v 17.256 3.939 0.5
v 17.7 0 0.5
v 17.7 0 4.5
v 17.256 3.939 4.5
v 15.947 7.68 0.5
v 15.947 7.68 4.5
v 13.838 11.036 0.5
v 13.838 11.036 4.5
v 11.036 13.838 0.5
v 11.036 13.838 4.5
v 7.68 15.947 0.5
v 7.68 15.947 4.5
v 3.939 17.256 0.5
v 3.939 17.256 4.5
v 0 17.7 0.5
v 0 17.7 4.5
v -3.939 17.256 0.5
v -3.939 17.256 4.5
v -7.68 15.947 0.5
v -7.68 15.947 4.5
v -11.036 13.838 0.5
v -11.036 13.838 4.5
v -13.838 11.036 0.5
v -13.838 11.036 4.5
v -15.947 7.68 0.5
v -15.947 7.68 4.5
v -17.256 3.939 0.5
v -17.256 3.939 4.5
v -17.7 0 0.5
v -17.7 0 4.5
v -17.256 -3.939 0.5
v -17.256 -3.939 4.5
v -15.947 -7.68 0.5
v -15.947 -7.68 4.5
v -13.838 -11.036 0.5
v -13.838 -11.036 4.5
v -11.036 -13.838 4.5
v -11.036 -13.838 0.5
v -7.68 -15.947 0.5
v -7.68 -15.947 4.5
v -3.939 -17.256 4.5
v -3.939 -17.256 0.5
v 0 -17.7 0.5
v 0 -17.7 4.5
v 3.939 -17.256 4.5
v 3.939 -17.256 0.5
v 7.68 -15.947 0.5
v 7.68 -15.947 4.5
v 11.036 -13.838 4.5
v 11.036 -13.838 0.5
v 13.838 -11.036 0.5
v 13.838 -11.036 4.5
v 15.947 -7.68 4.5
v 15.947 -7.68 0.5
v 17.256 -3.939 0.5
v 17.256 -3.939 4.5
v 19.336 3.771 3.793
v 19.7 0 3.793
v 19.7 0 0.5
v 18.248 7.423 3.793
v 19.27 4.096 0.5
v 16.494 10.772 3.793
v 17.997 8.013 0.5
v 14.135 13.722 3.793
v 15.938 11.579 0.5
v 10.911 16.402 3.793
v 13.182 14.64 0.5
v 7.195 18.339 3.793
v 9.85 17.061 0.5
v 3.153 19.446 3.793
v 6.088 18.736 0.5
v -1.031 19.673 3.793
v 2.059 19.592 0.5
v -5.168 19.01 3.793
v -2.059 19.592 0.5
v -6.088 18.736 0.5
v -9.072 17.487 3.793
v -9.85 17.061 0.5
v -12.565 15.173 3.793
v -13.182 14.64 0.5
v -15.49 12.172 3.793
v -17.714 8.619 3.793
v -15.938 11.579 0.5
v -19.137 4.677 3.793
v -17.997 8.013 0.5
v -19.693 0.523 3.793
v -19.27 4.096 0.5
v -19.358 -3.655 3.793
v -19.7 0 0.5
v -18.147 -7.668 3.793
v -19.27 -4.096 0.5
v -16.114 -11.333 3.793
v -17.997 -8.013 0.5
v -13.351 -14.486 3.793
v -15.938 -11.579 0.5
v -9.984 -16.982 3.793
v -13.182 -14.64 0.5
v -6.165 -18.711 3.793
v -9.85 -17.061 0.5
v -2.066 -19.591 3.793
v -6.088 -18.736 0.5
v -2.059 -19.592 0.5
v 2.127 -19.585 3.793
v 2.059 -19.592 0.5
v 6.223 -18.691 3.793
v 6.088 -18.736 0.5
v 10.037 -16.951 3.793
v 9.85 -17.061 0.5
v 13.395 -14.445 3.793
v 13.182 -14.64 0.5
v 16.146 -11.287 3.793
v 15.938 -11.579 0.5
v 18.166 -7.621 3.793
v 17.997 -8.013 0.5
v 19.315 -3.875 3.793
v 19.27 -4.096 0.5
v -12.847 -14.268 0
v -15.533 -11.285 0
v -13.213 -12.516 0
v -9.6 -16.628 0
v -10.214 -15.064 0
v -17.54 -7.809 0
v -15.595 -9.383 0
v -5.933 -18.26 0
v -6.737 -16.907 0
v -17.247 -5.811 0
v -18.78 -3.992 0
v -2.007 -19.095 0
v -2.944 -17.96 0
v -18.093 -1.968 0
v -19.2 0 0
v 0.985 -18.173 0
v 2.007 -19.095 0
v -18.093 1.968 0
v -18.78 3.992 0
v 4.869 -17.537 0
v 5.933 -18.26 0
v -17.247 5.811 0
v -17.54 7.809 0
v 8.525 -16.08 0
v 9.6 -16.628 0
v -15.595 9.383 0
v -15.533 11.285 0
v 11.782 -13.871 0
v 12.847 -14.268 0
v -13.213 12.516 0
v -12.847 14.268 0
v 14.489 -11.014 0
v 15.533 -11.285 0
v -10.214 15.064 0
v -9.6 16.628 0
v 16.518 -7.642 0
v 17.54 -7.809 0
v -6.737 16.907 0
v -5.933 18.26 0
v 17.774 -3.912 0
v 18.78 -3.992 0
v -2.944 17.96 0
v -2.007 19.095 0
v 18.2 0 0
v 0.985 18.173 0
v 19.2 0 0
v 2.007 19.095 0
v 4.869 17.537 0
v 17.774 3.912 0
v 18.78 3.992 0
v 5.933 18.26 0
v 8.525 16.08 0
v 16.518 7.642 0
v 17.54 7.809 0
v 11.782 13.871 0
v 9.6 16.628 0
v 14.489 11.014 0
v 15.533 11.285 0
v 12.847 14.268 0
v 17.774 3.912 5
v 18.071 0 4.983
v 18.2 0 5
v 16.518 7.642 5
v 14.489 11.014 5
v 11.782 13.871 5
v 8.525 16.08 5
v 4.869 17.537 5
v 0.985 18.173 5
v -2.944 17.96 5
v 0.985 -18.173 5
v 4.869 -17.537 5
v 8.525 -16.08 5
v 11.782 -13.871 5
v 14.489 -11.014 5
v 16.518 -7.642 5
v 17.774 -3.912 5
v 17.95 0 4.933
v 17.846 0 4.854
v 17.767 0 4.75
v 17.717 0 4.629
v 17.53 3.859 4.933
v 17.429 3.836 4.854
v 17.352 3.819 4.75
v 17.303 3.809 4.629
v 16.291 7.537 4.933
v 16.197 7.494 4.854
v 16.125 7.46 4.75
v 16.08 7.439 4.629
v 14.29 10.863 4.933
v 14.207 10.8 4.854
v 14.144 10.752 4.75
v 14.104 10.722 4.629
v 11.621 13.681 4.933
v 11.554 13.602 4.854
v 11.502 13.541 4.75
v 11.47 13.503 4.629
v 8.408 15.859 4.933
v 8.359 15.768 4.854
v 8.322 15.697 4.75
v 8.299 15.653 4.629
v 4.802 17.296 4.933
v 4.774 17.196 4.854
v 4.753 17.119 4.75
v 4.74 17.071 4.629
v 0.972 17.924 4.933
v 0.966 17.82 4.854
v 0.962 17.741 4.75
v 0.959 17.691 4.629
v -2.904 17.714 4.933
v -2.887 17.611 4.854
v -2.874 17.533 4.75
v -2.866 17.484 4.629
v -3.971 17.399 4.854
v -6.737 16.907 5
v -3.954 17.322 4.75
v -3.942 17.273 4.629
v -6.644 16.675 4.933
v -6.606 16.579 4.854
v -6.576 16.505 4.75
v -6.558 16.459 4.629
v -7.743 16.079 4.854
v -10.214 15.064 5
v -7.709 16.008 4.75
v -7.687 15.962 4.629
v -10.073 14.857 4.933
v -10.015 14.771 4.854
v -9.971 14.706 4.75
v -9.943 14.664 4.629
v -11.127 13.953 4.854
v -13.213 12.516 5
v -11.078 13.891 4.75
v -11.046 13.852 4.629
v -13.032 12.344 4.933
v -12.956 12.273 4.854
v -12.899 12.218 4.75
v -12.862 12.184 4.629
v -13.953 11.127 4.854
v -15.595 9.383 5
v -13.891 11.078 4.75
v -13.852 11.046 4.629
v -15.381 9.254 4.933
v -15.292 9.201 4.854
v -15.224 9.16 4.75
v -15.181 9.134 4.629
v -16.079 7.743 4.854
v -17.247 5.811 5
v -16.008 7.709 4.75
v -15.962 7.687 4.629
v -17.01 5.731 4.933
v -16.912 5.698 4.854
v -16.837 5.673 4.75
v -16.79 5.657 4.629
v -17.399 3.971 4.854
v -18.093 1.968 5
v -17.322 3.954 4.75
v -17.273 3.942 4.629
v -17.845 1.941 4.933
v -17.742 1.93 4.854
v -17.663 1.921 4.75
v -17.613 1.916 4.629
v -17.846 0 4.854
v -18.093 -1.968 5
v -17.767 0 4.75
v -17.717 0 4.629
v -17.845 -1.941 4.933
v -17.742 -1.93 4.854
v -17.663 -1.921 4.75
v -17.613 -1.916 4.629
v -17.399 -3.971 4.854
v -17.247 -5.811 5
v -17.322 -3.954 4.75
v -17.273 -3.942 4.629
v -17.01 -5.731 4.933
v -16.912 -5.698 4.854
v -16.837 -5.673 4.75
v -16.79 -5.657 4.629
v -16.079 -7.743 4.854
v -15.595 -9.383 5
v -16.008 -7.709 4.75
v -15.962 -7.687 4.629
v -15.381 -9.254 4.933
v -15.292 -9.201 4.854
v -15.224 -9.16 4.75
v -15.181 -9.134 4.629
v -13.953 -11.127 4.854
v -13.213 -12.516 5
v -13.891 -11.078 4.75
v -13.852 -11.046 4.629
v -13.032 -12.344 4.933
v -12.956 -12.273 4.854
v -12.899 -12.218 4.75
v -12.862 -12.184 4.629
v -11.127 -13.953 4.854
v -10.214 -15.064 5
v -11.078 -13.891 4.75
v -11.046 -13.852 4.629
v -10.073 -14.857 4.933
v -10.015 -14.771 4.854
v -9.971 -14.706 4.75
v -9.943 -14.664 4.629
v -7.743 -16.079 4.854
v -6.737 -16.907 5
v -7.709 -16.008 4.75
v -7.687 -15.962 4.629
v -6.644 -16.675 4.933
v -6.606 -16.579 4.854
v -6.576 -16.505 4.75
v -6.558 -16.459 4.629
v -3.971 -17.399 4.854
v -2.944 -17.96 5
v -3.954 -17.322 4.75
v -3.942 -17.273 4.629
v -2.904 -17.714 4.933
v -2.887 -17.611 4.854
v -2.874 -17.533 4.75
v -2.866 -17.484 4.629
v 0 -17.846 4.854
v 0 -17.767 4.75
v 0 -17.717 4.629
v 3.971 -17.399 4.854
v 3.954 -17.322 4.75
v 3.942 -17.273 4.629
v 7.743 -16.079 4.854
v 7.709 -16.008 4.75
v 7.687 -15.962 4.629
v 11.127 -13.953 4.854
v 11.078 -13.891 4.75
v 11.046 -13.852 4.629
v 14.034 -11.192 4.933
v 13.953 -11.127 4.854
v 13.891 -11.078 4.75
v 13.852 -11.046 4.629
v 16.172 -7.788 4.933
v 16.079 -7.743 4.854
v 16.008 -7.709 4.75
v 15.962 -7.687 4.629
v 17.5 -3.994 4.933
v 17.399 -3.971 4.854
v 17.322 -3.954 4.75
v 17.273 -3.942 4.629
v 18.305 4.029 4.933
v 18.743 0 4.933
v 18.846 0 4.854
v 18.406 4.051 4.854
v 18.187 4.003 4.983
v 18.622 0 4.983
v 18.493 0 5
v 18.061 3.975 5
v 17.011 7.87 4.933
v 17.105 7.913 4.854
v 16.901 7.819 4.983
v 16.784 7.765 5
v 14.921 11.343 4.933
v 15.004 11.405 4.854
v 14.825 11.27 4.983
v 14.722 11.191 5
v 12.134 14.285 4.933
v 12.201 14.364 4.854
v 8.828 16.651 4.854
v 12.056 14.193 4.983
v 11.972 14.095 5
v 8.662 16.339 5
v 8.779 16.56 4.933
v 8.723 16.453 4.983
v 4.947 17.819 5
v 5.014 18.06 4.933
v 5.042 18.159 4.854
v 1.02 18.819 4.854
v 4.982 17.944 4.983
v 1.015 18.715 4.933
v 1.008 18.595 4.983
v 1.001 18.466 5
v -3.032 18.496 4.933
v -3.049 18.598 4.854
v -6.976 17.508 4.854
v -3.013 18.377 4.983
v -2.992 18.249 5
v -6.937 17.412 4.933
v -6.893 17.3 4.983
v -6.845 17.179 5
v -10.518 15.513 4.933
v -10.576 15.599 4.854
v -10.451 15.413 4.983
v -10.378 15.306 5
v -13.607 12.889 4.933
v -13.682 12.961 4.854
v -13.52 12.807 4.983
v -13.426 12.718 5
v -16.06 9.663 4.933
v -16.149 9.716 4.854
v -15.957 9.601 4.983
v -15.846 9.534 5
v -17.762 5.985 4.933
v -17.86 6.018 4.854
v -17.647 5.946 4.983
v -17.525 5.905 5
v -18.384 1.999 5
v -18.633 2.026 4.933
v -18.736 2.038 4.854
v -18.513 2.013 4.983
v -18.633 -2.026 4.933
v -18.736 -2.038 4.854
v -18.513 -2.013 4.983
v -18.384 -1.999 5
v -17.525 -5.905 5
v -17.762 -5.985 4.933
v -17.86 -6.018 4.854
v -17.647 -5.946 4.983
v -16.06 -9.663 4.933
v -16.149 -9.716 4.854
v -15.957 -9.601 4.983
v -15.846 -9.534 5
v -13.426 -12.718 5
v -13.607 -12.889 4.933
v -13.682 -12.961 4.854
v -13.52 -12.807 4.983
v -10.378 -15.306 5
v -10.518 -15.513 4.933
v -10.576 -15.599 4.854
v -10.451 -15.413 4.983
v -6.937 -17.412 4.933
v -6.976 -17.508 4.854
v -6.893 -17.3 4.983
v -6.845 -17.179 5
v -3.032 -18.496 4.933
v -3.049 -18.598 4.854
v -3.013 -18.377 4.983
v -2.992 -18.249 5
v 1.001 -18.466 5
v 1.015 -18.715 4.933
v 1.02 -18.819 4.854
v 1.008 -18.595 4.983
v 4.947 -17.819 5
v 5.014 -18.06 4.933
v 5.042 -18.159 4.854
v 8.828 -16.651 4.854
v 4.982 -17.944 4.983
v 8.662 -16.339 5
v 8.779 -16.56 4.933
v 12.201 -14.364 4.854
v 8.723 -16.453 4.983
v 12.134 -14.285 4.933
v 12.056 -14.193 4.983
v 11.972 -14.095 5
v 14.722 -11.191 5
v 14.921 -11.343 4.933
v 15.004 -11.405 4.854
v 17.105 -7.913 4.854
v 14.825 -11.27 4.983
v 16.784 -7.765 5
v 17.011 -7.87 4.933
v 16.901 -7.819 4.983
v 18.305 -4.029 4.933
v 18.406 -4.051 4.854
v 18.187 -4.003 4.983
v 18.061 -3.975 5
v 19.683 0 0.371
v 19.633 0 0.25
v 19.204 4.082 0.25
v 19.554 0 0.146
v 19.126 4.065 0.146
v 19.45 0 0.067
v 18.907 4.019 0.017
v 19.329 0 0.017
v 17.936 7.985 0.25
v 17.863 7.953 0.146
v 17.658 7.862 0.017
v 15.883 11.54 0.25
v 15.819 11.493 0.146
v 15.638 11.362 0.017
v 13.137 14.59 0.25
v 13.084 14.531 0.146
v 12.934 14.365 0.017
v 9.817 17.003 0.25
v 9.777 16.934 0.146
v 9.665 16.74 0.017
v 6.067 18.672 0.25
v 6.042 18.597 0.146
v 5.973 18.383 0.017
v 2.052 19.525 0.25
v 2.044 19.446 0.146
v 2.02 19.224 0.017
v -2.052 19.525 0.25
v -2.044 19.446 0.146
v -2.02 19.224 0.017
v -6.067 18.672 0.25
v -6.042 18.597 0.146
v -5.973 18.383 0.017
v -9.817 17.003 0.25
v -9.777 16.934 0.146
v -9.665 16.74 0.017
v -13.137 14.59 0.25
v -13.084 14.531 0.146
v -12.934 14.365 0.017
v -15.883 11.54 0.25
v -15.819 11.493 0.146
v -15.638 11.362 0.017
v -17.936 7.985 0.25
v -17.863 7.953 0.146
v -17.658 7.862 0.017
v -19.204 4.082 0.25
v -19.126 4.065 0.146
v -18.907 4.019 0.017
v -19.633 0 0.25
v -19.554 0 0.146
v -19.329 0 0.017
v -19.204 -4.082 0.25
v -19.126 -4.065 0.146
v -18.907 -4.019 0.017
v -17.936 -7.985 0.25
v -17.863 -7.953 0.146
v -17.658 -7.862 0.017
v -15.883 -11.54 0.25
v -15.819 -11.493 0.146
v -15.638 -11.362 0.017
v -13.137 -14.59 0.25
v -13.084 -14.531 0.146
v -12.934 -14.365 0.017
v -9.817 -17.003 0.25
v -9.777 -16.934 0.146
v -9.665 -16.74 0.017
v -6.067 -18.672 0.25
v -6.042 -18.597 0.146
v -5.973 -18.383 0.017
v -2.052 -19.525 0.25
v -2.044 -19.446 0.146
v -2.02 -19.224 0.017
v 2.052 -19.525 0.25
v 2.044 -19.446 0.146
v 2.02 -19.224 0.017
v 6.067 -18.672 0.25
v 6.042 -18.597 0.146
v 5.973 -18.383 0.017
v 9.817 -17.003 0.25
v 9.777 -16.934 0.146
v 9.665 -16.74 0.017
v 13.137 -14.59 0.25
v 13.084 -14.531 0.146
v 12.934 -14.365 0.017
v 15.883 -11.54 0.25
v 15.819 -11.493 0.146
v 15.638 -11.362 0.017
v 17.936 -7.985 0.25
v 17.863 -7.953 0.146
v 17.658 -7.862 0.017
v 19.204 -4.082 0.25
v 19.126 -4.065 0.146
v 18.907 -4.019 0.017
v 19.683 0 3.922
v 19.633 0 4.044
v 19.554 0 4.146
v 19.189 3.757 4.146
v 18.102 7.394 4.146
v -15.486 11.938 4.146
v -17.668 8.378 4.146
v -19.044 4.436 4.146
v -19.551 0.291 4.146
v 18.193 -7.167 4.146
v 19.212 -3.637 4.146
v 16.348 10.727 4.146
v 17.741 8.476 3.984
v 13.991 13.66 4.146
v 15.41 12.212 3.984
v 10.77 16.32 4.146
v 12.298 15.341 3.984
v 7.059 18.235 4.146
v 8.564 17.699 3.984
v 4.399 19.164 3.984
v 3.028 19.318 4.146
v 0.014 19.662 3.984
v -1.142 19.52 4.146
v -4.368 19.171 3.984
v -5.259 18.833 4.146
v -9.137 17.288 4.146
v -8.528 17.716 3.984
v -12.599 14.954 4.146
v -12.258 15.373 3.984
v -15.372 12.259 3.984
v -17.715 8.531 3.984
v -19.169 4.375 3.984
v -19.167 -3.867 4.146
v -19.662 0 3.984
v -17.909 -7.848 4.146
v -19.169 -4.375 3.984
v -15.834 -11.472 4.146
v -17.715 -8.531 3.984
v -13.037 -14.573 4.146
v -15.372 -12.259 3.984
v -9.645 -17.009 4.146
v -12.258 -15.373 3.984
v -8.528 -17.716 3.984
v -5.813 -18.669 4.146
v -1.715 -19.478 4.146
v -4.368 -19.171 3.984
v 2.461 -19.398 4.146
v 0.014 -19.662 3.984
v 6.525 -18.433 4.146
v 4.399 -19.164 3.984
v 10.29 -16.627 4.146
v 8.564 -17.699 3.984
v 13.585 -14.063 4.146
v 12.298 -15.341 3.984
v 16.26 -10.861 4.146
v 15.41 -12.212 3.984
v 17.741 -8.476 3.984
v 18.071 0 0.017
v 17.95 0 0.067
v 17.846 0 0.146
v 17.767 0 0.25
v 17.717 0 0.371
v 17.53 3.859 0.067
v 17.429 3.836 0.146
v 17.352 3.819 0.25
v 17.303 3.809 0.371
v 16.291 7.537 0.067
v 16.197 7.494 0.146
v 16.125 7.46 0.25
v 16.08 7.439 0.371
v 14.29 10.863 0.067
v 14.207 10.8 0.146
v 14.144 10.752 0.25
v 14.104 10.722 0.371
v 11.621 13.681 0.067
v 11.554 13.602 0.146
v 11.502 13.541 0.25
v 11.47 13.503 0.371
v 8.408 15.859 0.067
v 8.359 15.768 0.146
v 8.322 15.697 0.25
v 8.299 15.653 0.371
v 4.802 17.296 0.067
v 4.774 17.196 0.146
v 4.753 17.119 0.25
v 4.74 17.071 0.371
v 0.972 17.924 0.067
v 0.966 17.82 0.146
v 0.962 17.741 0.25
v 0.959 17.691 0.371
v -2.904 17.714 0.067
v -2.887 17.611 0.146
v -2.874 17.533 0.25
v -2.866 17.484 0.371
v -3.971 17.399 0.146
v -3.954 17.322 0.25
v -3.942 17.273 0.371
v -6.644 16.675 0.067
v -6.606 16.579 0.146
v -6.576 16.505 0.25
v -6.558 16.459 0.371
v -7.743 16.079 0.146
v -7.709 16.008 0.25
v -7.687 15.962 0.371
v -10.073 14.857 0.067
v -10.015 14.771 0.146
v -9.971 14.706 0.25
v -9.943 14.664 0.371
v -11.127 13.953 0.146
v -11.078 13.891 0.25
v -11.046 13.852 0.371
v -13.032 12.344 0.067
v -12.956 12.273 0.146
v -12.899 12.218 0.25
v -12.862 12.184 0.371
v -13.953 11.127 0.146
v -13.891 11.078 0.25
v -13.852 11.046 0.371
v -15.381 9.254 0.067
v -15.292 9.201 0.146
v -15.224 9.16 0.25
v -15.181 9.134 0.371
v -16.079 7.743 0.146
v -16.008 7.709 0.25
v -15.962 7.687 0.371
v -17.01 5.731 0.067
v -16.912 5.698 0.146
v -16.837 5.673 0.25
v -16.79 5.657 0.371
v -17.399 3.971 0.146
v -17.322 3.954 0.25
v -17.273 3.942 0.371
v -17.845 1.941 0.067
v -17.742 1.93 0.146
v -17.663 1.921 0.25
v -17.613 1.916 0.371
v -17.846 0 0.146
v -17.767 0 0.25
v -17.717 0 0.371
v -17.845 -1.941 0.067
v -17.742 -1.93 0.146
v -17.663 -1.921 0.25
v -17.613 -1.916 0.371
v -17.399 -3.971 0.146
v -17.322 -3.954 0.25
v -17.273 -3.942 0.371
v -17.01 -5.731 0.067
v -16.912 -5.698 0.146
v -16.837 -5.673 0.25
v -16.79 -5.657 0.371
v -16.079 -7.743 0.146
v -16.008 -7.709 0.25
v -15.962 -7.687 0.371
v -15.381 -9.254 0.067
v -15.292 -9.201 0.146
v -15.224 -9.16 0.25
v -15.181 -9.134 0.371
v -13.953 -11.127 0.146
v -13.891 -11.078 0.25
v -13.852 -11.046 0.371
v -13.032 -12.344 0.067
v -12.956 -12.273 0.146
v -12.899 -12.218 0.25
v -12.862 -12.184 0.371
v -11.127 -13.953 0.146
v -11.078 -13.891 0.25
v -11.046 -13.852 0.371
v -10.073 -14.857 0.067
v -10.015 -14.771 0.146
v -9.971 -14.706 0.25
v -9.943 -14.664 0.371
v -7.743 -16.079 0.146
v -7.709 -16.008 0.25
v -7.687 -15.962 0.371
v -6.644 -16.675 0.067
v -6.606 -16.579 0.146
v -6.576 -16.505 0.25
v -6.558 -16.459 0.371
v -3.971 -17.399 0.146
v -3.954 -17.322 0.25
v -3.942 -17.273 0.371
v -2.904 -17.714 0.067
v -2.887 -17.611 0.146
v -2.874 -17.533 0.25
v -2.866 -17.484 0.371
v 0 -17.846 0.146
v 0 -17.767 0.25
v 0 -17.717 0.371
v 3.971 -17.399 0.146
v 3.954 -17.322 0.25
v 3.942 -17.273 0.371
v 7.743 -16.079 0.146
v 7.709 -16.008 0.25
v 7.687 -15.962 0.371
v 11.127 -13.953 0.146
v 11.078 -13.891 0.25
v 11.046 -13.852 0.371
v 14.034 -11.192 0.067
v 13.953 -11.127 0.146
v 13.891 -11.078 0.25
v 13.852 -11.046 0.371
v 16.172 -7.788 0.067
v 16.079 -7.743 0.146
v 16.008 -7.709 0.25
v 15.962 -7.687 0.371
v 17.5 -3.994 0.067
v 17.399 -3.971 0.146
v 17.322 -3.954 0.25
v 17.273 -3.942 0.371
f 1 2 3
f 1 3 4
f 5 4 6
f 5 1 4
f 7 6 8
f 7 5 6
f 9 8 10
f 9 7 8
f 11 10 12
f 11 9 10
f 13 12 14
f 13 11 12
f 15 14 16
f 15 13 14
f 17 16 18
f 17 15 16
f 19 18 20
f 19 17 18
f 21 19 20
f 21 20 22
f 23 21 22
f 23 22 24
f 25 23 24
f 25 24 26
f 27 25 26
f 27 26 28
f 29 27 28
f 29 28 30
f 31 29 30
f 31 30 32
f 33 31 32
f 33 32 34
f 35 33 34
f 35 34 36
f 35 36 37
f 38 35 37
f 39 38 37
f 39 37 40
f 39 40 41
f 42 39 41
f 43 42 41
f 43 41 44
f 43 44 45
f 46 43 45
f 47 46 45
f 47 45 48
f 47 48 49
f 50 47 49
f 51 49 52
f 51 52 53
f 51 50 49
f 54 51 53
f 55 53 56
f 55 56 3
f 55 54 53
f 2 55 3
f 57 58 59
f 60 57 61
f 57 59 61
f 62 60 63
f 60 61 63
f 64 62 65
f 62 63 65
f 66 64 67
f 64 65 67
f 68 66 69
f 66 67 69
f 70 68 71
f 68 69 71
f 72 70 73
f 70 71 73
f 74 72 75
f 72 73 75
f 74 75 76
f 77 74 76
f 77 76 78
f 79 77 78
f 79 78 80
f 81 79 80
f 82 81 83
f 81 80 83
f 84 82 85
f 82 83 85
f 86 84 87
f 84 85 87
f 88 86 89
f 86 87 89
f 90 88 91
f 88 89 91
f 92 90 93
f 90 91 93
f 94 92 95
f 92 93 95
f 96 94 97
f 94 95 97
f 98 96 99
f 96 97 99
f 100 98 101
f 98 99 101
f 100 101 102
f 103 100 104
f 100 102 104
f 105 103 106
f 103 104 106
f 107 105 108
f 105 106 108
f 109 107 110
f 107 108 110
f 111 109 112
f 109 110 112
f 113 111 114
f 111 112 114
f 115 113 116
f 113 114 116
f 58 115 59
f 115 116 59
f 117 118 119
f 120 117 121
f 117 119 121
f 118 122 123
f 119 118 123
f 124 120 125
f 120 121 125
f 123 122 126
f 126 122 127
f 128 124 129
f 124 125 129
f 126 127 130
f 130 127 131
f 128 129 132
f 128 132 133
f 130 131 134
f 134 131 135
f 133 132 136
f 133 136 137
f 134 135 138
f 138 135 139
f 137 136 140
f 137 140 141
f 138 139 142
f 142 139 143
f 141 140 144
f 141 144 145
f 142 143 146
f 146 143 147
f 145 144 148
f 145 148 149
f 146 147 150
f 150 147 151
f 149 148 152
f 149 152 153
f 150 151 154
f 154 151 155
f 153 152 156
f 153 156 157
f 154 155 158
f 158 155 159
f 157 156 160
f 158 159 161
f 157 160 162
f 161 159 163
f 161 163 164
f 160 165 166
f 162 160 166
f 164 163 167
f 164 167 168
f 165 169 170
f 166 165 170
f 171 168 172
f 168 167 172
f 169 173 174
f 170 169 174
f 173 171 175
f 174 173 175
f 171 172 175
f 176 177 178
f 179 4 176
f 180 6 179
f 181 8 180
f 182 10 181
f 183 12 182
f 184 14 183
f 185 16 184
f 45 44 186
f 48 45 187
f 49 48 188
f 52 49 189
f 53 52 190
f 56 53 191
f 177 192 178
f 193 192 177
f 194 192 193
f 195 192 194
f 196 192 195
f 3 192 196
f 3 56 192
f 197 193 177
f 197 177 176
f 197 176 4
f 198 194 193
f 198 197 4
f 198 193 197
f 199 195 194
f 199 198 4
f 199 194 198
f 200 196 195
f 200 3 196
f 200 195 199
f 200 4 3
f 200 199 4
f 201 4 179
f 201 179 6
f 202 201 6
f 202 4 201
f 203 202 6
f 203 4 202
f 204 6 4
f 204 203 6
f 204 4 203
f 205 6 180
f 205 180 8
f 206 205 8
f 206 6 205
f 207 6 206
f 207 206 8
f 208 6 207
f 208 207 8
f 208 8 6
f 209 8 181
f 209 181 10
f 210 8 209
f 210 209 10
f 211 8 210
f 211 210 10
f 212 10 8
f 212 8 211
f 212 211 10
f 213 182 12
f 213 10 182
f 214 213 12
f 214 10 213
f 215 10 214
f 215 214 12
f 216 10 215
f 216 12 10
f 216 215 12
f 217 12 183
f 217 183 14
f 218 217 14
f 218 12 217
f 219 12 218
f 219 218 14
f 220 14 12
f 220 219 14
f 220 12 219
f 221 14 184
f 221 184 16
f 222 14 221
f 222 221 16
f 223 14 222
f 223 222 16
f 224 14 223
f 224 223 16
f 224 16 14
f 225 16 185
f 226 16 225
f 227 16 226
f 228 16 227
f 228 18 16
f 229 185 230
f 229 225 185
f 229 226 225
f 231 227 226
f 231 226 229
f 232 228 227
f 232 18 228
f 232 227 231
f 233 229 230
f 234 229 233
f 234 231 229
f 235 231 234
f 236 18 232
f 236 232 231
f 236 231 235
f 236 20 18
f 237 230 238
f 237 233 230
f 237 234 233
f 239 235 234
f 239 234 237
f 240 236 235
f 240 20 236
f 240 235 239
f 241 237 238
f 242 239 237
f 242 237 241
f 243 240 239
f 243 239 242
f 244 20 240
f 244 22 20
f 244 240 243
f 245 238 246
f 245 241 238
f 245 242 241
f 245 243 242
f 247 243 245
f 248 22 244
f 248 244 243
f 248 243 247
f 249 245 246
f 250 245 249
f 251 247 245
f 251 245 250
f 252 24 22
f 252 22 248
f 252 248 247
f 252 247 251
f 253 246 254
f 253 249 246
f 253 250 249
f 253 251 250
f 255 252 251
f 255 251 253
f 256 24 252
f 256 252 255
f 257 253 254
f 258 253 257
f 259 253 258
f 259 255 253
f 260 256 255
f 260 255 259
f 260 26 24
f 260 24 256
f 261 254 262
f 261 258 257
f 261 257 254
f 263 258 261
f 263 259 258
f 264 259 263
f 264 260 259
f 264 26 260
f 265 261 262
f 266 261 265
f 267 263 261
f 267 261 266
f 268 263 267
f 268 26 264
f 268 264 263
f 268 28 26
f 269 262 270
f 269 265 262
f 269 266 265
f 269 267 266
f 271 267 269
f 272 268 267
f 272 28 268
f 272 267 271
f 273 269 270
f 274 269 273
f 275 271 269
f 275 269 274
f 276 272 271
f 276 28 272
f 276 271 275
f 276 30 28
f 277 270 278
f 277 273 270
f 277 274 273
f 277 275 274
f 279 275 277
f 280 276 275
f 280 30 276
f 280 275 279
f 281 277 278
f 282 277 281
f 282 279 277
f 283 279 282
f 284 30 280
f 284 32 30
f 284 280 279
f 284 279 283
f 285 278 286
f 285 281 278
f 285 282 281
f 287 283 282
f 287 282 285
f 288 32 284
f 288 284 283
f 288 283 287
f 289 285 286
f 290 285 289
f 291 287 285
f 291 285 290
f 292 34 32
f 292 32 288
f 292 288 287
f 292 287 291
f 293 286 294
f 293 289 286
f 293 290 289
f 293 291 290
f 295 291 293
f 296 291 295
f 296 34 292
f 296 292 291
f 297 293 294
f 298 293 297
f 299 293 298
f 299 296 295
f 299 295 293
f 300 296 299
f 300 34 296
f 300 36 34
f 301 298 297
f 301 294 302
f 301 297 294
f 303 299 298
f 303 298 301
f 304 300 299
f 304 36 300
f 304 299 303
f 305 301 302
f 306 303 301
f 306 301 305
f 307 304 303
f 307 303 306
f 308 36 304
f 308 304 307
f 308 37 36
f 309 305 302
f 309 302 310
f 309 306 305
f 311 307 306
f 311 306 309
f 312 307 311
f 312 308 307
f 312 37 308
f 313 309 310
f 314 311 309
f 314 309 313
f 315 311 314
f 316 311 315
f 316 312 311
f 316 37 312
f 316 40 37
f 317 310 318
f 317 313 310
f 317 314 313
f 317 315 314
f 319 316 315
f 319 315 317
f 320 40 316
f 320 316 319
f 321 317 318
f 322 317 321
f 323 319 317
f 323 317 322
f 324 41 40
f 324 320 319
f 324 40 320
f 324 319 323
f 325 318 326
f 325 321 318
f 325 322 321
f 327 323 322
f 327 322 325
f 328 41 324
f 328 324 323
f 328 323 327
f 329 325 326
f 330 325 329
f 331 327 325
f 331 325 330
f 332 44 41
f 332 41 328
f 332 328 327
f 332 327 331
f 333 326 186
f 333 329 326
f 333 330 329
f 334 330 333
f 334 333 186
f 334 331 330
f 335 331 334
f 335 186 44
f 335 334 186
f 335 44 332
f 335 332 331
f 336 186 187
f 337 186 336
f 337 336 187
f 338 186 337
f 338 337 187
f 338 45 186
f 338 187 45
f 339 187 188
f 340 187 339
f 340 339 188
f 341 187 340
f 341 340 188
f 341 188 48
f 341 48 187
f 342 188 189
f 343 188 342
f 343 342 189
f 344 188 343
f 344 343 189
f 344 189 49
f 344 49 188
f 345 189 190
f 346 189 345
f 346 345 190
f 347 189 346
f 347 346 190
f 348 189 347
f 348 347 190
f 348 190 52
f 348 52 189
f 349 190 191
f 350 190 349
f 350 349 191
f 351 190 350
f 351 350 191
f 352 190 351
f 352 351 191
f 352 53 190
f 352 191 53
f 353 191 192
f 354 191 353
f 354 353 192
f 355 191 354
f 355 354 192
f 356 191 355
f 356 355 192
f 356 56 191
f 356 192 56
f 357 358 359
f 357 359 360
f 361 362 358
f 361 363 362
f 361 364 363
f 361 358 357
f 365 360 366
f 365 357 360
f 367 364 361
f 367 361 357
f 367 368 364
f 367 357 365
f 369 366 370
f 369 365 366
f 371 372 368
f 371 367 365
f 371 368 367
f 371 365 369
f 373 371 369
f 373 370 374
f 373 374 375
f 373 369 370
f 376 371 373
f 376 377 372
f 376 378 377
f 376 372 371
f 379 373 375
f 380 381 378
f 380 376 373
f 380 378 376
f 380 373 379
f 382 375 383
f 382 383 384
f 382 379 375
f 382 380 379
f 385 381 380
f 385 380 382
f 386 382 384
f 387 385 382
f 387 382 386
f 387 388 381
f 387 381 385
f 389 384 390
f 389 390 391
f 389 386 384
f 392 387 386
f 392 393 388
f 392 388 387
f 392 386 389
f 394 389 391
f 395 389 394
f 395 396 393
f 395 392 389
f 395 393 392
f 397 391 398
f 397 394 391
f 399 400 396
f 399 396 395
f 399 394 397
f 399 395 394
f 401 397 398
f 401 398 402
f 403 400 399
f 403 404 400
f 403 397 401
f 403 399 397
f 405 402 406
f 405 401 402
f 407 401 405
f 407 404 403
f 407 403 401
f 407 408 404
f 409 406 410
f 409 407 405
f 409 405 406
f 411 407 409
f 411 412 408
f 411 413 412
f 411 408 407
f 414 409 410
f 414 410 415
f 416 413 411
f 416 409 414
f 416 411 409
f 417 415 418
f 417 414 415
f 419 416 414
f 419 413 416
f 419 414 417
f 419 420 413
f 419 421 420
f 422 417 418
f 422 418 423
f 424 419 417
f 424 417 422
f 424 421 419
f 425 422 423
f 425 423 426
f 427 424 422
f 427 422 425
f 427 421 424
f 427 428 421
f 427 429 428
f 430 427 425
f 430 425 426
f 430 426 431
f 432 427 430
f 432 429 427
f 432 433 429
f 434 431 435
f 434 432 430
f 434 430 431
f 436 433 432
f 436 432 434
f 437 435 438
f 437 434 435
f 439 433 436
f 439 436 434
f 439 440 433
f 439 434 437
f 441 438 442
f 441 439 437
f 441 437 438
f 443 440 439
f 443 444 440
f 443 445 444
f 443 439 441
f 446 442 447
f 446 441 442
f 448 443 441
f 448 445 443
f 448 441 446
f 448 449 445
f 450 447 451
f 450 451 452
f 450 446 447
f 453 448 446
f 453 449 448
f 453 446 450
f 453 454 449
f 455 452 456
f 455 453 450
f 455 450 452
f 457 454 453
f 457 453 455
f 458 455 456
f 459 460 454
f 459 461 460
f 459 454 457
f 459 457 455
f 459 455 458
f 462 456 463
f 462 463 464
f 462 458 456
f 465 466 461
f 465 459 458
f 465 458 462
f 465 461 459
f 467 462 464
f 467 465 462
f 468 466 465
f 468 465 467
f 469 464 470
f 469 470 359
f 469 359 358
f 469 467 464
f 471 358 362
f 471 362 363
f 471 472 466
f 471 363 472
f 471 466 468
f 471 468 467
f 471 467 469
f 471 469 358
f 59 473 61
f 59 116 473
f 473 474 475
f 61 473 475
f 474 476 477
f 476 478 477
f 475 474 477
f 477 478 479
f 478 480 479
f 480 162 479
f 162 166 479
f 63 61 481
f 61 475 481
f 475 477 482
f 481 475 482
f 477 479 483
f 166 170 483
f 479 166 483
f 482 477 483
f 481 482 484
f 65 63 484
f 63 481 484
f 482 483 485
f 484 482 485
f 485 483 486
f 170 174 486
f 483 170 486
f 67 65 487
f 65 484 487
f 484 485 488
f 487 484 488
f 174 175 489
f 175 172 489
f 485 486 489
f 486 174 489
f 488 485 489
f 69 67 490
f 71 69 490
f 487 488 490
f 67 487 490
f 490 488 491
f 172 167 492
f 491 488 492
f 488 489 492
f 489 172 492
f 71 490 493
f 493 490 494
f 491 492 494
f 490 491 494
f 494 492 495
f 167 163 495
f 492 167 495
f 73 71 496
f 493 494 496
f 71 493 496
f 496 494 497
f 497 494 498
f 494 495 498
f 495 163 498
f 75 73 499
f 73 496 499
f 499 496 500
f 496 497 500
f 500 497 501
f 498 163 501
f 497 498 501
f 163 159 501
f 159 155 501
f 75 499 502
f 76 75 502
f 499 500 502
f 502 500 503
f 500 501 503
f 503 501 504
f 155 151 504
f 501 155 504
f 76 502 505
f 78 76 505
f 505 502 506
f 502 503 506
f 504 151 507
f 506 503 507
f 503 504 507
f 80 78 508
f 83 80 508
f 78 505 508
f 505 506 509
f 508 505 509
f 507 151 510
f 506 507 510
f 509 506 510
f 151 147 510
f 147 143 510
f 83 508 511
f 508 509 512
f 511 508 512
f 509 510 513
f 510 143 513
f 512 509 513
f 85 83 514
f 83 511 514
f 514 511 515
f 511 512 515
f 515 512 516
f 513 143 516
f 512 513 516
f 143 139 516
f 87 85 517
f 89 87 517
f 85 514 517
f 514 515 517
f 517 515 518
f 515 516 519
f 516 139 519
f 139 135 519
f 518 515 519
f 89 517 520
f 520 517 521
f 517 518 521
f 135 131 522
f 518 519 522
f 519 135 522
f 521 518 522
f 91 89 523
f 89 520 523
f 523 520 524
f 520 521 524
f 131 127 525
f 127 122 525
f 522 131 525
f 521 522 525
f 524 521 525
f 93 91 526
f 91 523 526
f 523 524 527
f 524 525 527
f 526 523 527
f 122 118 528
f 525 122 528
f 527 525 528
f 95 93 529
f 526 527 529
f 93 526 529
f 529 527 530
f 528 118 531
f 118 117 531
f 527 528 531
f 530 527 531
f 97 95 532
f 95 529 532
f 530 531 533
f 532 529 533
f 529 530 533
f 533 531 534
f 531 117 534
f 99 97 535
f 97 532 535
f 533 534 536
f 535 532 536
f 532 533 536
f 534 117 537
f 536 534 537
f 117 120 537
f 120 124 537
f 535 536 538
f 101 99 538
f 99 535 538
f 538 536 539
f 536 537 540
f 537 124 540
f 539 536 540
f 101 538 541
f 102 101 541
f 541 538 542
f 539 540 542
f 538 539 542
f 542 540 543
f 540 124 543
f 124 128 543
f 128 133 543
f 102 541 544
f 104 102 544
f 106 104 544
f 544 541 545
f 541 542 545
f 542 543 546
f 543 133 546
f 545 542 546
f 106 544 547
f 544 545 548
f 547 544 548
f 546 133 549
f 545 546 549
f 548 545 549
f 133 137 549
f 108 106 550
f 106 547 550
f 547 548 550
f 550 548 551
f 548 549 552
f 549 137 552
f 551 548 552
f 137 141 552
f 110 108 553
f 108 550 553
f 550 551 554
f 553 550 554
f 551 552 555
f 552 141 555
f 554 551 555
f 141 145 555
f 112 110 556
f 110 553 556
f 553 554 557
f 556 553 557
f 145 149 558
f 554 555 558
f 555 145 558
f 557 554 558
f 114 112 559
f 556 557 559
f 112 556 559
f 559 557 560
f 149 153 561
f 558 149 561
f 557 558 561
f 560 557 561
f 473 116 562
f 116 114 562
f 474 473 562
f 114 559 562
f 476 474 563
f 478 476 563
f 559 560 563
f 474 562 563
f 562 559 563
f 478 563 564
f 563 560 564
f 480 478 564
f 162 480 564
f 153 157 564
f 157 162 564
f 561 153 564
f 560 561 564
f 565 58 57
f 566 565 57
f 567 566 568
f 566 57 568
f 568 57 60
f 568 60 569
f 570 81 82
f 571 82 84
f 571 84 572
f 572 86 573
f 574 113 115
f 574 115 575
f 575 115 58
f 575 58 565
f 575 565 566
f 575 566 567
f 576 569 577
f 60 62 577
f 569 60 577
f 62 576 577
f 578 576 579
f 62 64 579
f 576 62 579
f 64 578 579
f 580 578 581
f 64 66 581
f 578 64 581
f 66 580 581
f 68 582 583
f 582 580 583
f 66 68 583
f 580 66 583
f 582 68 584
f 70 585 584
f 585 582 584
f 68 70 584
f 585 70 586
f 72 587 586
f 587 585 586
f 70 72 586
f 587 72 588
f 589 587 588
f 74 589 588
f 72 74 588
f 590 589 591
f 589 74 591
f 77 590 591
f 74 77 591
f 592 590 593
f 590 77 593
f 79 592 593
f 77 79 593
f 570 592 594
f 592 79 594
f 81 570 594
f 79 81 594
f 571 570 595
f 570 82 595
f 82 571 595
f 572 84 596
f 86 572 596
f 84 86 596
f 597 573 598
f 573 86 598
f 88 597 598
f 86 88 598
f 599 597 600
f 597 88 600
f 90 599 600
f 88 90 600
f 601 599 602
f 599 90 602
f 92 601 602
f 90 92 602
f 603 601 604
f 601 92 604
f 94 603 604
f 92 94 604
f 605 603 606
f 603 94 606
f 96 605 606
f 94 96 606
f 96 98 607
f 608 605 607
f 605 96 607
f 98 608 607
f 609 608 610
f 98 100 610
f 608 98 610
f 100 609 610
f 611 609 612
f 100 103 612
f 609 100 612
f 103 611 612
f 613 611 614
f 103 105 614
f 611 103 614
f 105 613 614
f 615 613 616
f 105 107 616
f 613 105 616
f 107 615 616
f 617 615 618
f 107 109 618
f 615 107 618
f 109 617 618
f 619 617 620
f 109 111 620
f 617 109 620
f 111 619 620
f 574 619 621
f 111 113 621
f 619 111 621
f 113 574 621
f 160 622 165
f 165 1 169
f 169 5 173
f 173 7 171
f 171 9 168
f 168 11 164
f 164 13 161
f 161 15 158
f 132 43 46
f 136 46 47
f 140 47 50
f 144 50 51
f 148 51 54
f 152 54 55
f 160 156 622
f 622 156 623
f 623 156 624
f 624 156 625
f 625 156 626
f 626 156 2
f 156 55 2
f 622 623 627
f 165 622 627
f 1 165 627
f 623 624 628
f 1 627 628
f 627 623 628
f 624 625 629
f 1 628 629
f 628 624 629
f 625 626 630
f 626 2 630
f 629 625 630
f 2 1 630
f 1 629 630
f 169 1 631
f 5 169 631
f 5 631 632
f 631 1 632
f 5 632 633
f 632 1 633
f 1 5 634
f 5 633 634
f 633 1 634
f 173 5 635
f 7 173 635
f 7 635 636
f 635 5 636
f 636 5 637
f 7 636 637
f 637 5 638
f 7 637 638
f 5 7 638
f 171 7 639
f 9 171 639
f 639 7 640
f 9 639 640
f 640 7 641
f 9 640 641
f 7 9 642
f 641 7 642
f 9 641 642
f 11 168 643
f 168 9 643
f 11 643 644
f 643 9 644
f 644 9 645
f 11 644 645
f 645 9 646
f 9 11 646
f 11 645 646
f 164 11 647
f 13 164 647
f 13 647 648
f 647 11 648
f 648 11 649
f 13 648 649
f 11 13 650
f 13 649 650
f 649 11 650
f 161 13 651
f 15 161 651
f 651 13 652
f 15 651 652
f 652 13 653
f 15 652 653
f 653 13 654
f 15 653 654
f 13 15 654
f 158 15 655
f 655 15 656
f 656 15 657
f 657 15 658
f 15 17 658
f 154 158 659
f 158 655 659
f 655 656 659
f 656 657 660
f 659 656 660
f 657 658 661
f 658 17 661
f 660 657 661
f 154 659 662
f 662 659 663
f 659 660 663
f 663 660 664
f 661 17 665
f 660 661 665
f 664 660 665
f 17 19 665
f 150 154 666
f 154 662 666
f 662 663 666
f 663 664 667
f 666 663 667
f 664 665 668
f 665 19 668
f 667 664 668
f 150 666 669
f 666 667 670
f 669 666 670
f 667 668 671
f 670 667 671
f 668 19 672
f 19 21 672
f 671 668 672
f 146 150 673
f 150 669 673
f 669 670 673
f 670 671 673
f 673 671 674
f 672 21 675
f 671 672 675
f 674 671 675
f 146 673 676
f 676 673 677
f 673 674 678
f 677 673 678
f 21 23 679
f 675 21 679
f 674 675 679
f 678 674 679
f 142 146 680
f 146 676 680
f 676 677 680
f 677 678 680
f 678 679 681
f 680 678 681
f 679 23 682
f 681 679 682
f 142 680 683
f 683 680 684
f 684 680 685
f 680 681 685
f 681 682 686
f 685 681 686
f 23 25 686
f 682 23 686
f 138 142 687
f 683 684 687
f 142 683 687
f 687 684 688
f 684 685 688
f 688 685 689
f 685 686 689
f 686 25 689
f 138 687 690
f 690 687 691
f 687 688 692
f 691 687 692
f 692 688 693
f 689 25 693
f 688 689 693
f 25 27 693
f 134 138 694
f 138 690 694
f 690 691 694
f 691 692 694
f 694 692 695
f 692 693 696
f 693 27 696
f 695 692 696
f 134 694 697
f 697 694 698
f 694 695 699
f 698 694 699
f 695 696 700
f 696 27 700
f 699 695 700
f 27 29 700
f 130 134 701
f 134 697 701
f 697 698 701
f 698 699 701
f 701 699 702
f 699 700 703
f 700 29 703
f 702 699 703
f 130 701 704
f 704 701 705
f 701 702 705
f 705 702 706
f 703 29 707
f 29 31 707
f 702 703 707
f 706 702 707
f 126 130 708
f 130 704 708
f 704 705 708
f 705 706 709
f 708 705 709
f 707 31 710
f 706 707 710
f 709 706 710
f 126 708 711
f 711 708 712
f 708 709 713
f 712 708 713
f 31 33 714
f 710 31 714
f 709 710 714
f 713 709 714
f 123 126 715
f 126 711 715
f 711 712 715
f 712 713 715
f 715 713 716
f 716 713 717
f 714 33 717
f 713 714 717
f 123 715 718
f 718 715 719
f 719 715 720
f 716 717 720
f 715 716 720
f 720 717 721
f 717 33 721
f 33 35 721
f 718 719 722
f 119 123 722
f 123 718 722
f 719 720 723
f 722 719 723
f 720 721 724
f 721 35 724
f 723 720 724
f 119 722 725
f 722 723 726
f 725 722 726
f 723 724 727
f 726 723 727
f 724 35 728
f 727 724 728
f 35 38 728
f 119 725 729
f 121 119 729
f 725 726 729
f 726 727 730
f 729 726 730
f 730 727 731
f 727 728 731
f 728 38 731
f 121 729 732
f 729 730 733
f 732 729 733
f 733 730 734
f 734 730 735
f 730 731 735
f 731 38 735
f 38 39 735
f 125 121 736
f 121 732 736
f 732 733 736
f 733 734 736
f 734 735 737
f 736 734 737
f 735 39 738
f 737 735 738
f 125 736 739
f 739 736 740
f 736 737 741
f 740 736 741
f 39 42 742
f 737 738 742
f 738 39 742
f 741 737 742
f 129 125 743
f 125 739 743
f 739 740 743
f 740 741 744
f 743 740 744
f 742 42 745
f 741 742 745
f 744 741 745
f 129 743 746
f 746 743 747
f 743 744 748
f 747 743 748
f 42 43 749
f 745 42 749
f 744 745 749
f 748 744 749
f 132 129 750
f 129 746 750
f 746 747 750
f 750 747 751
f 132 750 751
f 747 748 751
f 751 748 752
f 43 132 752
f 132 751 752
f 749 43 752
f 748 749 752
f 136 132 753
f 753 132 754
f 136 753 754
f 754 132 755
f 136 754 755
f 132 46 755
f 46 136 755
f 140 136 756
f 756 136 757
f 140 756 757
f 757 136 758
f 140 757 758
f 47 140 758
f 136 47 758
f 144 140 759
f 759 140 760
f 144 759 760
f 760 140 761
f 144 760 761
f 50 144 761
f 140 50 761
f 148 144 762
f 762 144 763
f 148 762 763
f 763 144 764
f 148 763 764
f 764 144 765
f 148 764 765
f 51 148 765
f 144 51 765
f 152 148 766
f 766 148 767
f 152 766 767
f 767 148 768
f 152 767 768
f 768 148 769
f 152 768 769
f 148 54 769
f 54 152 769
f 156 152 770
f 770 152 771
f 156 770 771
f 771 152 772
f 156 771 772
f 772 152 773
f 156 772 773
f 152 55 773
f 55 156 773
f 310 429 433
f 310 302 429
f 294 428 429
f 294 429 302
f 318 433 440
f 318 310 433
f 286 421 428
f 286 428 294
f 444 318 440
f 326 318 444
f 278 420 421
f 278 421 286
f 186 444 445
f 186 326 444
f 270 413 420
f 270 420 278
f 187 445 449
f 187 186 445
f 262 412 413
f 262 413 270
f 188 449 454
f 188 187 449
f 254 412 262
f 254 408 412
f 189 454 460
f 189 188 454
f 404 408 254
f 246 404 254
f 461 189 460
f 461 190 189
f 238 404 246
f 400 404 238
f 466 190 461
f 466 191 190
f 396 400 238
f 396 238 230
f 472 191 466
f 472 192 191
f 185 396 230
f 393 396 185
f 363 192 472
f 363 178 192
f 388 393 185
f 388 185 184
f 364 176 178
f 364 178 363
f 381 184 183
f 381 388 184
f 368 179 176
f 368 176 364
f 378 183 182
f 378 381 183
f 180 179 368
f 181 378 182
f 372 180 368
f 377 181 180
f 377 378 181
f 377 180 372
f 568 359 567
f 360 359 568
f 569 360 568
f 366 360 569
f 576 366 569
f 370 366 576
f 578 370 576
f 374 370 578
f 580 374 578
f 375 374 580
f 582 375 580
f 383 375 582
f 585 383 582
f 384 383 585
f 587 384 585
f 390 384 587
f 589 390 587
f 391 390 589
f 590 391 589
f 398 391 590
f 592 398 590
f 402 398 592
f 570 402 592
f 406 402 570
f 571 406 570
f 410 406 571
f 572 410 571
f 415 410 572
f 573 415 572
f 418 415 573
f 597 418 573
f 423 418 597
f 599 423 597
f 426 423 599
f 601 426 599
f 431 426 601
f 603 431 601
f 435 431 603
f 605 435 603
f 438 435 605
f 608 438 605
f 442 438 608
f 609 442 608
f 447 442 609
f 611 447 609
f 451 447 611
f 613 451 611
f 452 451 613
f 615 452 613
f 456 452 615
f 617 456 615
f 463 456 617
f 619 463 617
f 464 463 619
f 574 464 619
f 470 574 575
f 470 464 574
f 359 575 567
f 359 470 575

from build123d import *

# Parameters (mm, degrees)
F0_R     = 19.7
F1_DEPTH = 5
F2_T     = -2
F3_SIZE  = 1
F4_R     = 0.5


with BuildPart() as f1:
    # F0 (on Top) → F1 (new body)
    with BuildSketch(Plane.XY):
        Circle(F0_R)
    extrude(amount=F1_DEPTH)

    # F2
    f2_openings = [f1.faces().sort_by_distance(p)[0] for p in [
        (0, 0, 5),
        (0, 0, 0),
    ]]
    offset(amount=F2_T, openings=f2_openings)

    # F3
    f3_edges = [f1.edges().sort_by_distance(p)[0] for p in [
        (-19.7, 0, 5),
    ]]
    chamfer(f3_edges, length=F3_SIZE)

    # F4
    f4_edges = [f1.edges().sort_by_distance(p)[0] for p in [
        (19.2, 0, 4.5),
        (-19.7, 0, 4),
        (-18.7, 0, 5),
        (-19.7, 0, 0),
        (-17.7, 0, 5),
        (-17.7, 0, 0),
    ]]
    fillet(f4_edges, radius=F4_R)


solid = f1.part
